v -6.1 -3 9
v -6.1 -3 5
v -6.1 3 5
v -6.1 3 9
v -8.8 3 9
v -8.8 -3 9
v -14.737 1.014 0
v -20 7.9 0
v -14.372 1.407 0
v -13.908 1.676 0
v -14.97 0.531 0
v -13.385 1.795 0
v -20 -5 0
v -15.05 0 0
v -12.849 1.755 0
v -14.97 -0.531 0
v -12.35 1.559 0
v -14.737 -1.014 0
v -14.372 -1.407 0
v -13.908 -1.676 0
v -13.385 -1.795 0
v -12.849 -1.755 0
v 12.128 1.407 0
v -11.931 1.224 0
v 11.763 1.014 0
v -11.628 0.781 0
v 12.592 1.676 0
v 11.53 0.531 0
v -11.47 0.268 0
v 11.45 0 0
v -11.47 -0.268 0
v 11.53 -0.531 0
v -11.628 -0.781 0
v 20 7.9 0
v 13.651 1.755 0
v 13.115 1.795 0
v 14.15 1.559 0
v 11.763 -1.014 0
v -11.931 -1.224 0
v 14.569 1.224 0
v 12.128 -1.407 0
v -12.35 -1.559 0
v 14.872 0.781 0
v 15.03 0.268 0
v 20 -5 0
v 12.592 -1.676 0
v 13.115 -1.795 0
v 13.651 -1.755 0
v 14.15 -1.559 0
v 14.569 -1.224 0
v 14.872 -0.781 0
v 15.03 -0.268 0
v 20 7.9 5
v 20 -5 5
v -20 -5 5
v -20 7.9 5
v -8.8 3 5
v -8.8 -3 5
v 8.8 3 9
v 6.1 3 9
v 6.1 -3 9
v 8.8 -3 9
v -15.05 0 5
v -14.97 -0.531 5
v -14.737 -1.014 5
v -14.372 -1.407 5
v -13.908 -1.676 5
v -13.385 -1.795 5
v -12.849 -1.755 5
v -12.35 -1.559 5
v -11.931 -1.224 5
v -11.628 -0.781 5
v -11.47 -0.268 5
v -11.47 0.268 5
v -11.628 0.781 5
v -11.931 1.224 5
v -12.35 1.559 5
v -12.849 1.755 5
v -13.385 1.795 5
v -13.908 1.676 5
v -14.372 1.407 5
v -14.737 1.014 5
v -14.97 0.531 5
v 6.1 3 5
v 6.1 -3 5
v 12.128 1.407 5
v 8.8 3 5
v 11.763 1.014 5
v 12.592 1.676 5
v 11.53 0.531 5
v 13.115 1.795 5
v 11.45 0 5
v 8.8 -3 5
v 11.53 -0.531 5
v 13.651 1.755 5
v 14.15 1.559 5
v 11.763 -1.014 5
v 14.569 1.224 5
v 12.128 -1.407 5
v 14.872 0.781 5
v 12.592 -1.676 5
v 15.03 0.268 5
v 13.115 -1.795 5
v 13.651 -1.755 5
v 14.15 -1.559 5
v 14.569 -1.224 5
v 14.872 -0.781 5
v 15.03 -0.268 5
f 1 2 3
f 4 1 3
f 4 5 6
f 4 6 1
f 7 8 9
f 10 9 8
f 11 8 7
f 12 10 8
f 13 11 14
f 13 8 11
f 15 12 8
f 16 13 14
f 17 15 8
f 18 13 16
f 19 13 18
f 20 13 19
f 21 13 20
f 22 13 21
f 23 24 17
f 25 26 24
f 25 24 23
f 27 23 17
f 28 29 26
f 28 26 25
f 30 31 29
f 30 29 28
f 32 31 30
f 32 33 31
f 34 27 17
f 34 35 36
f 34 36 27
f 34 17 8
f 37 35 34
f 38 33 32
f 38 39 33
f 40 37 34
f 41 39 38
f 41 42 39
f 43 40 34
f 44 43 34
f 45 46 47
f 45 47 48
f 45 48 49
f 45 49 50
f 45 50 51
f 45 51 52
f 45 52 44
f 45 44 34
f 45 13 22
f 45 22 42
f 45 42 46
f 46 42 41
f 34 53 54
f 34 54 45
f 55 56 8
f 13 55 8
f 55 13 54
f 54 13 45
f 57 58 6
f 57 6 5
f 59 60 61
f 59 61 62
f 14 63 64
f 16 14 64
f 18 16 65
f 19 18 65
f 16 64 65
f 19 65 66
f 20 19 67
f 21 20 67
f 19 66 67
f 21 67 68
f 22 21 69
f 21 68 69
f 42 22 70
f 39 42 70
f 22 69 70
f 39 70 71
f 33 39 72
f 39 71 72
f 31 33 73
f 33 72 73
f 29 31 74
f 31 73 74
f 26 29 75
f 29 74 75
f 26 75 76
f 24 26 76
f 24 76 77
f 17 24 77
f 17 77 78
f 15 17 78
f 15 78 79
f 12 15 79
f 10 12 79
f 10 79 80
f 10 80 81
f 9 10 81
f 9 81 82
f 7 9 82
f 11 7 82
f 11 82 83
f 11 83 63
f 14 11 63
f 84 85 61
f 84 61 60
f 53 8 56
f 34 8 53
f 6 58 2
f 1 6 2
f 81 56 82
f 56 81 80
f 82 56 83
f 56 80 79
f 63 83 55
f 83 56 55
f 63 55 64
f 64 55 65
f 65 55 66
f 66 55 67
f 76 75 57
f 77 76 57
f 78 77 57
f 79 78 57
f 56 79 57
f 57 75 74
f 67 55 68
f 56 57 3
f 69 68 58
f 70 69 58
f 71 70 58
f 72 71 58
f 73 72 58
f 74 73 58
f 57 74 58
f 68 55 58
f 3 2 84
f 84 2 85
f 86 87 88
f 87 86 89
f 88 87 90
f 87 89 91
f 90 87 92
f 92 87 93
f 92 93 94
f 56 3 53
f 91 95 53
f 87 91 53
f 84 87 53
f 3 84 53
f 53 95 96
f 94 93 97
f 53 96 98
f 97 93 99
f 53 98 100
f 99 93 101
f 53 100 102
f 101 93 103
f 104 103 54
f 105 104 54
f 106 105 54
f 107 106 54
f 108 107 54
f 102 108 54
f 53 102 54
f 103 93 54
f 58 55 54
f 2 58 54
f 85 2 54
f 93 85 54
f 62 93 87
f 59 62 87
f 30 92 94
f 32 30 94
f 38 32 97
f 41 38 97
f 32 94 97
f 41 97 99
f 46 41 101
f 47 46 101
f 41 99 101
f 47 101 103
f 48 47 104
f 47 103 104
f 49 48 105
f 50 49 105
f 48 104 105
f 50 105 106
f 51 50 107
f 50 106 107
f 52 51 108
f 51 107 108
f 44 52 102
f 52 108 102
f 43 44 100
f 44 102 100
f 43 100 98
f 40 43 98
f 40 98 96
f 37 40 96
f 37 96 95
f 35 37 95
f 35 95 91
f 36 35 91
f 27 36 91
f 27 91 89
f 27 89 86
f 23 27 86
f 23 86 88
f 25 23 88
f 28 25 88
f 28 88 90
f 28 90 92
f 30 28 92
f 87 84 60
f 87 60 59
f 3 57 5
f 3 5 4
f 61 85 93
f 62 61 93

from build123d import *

# Parameters (mm, degrees)
SKETCH1_W            = 40
SKETCH1_H            = 10
BOSS_EXTRUDE1_DEPTH  = 5
M3_CLEARANCE_HOLE1_D = 3.6
SKETCH4_W            = 2.7
SKETCH4_H            = 6
BOSS_EXTRUDE2_DEPTH  = 4
SKETCH5_W            = 40
SKETCH5_H            = 5
BOSS_EXTRUDE3_DEPTH  = 2.9


with BuildPart() as part:
    # Sketch1 → Boss-Extrude1 (new body)
    with BuildSketch(Plane.XY):
        Rectangle(SKETCH1_W, SKETCH1_H)
    extrude(amount=BOSS_EXTRUDE1_DEPTH)

    # M3 Clearance Hole1 (through all)
    with Locations(Plane(origin=(0, 0, 0), x_dir=(1, 0, 0), z_dir=(0, 0, -1))):
        with Locations((-13.25, 0), (13.25, 0)):
            Hole(M3_CLEARANCE_HOLE1_D / 2)

    # Sketch4 → Boss-Extrude2 (add)
    with BuildSketch(Plane.XY.offset(5)):
        with Locations((-7.45, 0)):
            Rectangle(SKETCH4_W, SKETCH4_H)
        with Locations((7.45, 0)):
            Rectangle(SKETCH4_W, SKETCH4_H)
    extrude(amount=BOSS_EXTRUDE2_DEPTH)

    # Sketch5 → Boss-Extrude3 (add)
    with BuildSketch(Plane(origin=(0, 5, 0), x_dir=(1, 0, 0), z_dir=(0, 1, 0))):
        with Locations((0, -2.5)):
            Rectangle(SKETCH5_W, SKETCH5_H)
    extrude(amount=BOSS_EXTRUDE3_DEPTH)


solid = part.part
